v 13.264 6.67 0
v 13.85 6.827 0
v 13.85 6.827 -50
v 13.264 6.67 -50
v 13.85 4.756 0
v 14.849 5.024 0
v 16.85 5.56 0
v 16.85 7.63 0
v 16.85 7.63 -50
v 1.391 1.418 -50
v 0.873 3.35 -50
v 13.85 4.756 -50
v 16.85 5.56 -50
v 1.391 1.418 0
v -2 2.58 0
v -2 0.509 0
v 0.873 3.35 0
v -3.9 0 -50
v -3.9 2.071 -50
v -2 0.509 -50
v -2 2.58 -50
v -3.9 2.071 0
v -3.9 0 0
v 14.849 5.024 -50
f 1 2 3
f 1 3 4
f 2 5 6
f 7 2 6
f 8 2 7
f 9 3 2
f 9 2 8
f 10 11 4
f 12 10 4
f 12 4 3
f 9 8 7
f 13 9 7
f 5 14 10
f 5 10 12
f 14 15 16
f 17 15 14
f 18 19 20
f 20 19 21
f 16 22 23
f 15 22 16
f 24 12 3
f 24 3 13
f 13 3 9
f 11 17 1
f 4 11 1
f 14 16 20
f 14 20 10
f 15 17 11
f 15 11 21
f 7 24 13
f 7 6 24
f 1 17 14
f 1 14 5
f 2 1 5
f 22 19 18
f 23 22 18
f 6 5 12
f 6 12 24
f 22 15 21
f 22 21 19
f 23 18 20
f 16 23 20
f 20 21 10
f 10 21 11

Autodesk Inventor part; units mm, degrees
ref_plane "YZ Plane" through (0, 0, 0) normal (1, 0, 0) x (0, 1, 0)
ref_plane "XZ Plane" through (0, 0, 0) normal (0, 1, 0) x (-1, 0, 0)
ref_plane "XY Plane" through (0, 0, 0) normal (0, 0, 1) x (1, 0, 0)
sketch "Szkic1" plane through (0, 0, 0) normal (0, 0, 1) x (1, 0, 0)
  circle A0 centre (3.1, 43) radius 7 projected
  line L0 (-2, 50) -> (-2, 0)
  line L1 (-2, 50) -> (0, 50) projected
  line L2 (-3.9, 43) -> (-3.9, 0)
  line L3 (-3.9, 0) -> (-2, 0)
  line L4 (-3.9, 0) -> (14.8489, 5.0238)
  line L5 (-3.9, 0) -> (15.5103, 0) construction
  line L6 (1.3909, 1.4177) -> (0.8733, 3.3496)
  line L7 (0.8733, 3.3496) -> (-3.9, 2.0706)
  line L8 (0.8733, 3.3496) -> (13.2644, 6.6697)
  line L9 (13.85, 30) -> (13.85, 0) projected
  line L10 (13.85, 6.8267) -> (16.85, 7.6305)
  line L11 (13.85, 4.7561) -> (16.85, 5.5599)
  line L12 (16.85, 7.6305) -> (16.85, 5.5599)
  line L13 (13.85, 6.8267) -> (13.2644, 6.6697)
  point P0 (0, 0)
  point P1 (-2, 0)
  point P2 (16.85, 6.5952)
  dimension "d0" = 50
  dimension "d1" = 15
  dimension "d2" = 2
  dimension "d3" = 3
extrude "Wyciągnięcie proste1" add sketch "Szkic1" against normal blind 50 contours L7 L6 L4 L0 | L0 L4 L2 L7 | L8 L13 L9 L4 L6 | L9 L10 L12 L11 L4
properties part number "noz"
